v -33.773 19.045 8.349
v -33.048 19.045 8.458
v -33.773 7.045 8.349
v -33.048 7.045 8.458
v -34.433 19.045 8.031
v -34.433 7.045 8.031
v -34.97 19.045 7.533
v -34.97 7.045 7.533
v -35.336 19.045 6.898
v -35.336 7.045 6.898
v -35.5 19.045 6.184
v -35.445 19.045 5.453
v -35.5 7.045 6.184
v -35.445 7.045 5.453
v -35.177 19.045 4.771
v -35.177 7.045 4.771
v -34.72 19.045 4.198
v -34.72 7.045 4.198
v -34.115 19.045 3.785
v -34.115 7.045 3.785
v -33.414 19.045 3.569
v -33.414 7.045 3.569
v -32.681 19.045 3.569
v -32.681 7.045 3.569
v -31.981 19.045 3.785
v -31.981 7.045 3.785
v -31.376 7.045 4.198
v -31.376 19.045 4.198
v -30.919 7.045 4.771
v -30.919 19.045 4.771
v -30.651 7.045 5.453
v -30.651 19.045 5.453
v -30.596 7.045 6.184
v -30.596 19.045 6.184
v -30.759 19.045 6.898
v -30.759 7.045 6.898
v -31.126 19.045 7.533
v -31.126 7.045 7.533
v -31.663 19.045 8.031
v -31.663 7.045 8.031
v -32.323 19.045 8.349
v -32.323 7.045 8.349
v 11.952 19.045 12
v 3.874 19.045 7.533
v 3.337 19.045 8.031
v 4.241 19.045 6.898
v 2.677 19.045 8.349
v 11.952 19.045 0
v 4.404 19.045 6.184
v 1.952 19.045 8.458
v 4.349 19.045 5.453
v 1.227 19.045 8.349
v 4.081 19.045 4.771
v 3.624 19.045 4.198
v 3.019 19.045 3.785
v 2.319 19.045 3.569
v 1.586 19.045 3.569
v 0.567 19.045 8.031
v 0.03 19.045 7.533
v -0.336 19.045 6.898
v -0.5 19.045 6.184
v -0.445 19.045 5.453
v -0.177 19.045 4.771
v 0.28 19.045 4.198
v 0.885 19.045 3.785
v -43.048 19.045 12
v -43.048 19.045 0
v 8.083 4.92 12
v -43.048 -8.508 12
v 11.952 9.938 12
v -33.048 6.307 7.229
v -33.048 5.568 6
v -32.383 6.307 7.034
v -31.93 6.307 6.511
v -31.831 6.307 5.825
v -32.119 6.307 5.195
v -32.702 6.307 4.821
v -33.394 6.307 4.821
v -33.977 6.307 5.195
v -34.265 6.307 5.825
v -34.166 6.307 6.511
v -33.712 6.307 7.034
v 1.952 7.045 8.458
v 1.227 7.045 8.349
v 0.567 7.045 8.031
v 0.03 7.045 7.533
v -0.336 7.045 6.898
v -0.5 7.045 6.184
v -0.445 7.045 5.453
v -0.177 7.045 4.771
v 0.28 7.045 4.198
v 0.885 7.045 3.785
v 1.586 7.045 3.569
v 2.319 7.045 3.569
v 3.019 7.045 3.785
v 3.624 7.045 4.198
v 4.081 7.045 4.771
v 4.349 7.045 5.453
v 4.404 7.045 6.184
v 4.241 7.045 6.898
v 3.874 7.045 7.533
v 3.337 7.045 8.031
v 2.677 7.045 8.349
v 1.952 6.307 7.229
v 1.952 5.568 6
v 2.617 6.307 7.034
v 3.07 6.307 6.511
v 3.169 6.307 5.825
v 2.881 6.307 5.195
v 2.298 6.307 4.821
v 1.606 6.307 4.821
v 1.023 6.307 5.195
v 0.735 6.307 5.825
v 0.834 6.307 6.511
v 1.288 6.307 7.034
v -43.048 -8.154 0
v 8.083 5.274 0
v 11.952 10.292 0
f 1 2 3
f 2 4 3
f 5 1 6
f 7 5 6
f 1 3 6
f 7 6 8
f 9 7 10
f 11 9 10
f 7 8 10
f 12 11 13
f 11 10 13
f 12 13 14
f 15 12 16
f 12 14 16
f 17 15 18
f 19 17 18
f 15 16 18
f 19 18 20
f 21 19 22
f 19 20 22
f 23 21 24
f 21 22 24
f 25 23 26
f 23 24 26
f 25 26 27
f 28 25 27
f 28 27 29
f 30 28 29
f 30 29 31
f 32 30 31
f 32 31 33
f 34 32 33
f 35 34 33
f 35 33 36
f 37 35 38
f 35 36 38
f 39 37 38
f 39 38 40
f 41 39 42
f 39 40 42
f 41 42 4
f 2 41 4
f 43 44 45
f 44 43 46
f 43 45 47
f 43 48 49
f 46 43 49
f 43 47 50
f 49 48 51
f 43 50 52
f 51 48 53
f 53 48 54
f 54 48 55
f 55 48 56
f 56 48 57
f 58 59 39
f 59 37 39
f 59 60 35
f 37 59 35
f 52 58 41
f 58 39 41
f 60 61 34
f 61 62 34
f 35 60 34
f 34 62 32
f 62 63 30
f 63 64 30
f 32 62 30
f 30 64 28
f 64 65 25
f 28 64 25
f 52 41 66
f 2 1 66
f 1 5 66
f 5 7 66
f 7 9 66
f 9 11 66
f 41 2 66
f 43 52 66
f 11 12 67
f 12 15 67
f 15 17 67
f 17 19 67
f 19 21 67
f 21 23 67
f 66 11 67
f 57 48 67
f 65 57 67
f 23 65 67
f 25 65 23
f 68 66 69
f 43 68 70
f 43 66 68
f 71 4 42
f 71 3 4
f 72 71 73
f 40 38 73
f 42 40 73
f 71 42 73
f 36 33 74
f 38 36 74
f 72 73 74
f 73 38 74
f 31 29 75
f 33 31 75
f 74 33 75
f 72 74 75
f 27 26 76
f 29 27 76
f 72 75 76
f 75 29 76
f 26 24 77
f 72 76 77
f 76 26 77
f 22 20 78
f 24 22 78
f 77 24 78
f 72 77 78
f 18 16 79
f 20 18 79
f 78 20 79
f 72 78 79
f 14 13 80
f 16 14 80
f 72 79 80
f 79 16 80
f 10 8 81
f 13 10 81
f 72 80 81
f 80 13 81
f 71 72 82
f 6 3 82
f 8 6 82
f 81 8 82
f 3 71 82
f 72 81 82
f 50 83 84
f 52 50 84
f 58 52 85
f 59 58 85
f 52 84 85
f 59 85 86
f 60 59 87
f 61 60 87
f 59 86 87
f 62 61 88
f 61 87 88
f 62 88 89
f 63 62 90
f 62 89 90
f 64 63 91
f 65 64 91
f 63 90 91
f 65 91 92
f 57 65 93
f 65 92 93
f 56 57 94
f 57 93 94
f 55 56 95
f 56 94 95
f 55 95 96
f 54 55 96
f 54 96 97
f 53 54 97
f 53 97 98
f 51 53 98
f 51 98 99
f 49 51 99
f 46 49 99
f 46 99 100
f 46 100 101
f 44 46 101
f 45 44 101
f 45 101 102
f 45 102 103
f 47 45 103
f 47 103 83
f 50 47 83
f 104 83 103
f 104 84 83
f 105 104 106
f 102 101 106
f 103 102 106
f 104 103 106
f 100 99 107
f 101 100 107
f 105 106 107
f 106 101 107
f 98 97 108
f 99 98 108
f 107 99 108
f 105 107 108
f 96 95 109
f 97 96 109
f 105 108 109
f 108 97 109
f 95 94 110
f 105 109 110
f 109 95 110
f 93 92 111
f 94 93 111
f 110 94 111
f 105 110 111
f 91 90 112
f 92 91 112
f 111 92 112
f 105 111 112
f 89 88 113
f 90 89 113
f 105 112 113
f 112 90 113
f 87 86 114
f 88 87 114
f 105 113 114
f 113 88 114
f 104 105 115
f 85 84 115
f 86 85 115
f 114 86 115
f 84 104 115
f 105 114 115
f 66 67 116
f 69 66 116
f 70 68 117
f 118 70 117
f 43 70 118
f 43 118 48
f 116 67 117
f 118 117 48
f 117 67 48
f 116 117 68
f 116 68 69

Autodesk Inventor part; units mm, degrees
ref_plane "YZ Plane" through (0, 0, 0) normal (1, 0, 0) x (0, 1, 0)
ref_plane "XZ Plane" through (0, 0, 0) normal (0, 1, 0) x (-1, 0, 0)
sketch "スケッチ2" plane through (0, 0, 0) normal (0, 0, 1) x (1, 0, 0)
  line L0 (-43.0479, 19.0453) -> (-43.0479, -8.9547)
  line L1 (-43.0479, -8.9547) -> (11.9521, -8.9547)
  line L2 (11.9521, -8.9547) -> (11.9521, 19.0453)
  line L3 (11.9521, 19.0453) -> (-43.0479, 19.0453)
  point P0 (0, 0)
  dimension "d3" = 55
  dimension "d16" = 28
extrude "押し出し2" add sketch "スケッチ2" along normal blind 12
sketch "スケッチ4" plane through (-43.0479, 19.0453, 0) normal (0, 1, 0) x (1, 0, 0)
  line L0 (55, 0) -> (55, -12) projected
  line L1 (0, 0) -> (0, -12) projected
  line L2 (0, -6) -> (55, -6)
  line L3 (0, -12) -> (55, -12) projected
  line L4 (0, 0) -> (55, 0) projected
  point P0 (10, -6)
  point P1 (45, -6)
  dimension "d17" = 10
  dimension "d18" = 35
hole "穴2" at (-33.0479, 19.0453, 6) at (1.9521, 19.0453, 6) direction (0, -1, 0) diameter 4.917 depth 12 tip angle 118 thread size "M6x1" class "6H" standard "ISO Metric profile"
ref_plane "作業平面8" through (7.9805, 5.1586, 3) normal (0.2539, -0.9668, -0.0285) x (-0.9522, -0.2551, 0.1679)
sketch "スケッチ7" plane through (7.9805, 5.1586, 3) normal (0.2539, -0.9668, -0.0285) x (-0.9522, -0.2551, 0.1679)
  line L0 (-7.2879, 16.2377) -> (59.5212, 16.2377)
  line L1 (59.5212, 16.2377) -> (59.5212, -15.7653)
  line L2 (59.5212, -15.7653) -> (-7.2879, -15.7653)
  line L3 (-7.2879, -15.7653) -> (-7.2879, 16.2377)
extrude "押し出し5" cut sketch "スケッチ7" along normal through all
chamfer "面取り1" distance 4 angle 45 1 edges at (11.9521, 6.1134, 6)
properties part number "100012" material "STEEL - HIGH GRADE ALLOY, BLACK OXIDE FINISH"
